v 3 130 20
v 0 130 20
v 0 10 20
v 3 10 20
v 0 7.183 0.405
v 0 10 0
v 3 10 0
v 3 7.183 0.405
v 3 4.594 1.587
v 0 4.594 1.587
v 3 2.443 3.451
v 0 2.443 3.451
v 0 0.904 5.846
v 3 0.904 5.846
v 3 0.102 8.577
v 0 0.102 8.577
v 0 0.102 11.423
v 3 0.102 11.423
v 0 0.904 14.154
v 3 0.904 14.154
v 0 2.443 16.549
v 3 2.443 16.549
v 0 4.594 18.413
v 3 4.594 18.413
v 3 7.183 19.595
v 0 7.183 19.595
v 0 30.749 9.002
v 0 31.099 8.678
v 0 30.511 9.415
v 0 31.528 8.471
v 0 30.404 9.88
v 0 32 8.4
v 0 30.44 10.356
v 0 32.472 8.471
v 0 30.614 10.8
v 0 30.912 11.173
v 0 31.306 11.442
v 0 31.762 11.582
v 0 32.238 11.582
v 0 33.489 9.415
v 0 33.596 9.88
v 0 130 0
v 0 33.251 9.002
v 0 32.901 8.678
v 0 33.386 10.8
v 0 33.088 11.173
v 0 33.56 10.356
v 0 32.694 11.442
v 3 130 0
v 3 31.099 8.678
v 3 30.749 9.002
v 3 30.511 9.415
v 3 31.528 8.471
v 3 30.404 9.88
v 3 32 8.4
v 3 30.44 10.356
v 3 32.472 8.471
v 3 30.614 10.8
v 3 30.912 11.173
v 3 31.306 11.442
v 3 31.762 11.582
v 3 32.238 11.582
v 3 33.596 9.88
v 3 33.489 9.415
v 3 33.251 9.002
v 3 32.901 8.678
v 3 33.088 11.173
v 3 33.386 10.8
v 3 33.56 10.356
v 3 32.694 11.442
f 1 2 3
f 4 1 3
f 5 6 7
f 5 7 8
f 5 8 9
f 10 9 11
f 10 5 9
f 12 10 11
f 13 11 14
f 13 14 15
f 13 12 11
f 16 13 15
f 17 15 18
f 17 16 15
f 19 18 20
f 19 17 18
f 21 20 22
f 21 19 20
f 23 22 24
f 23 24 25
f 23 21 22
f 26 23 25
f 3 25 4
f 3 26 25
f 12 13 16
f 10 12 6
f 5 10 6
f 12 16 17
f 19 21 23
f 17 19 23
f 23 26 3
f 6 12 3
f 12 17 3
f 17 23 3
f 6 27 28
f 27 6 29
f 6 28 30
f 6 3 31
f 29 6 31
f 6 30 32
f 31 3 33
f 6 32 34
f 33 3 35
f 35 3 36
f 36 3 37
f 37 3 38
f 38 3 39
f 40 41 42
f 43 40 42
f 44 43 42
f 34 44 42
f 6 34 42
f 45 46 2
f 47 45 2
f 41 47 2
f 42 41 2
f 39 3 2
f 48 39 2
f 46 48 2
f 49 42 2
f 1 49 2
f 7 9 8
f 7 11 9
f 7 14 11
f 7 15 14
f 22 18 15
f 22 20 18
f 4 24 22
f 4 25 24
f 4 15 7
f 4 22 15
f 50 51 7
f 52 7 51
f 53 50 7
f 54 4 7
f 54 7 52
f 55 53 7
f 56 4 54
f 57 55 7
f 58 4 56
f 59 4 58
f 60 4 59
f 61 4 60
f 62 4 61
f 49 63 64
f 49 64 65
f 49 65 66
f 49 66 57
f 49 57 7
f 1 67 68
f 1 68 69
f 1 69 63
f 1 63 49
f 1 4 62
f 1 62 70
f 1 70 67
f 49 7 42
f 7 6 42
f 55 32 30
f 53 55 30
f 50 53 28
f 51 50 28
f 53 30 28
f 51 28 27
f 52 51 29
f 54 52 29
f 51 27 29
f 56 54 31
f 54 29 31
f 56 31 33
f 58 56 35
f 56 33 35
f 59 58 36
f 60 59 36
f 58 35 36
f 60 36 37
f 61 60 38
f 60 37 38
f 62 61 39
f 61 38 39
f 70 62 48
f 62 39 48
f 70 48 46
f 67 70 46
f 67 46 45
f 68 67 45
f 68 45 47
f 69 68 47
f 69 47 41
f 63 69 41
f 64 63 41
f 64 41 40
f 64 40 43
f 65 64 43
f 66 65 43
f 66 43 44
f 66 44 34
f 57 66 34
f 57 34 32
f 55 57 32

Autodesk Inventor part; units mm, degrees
ref_plane "YZ Plane" through (0, 0, 0) normal (1, 0, 0) x (0, 1, 0)
ref_plane "XZ Plane" through (0, 0, 0) normal (0, 1, 0) x (-1, 0, 0)
ref_plane "XY Plane" through (0, 0, 0) normal (0, 0, 1) x (1, 0, 0)
sketch "Szkic1" plane through (0, 0, 0) normal (1, 0, 0) x (0, 1, 0)
  line L0 (10, 0) -> (130, 0)
  line L1 (130, 0) -> (130, 20)
  line L2 (130, 20) -> (10, 20)
  line L3 (0, 10) -> (0, 10)
  arc A0 (0, 10) -> (10, 0) centre (10, 10) ccw
  arc A1 (10, 20) -> (0, 10) centre (10, 10) ccw
  point P0 (0, 0)
  point P1 (0, 20)
  dimension "d0" = 20
  dimension "d2" = 10
  dimension "d5" = 120
extrude "Wyciągnięcie proste1" add sketch "Szkic1" along normal blind 3
sketch "Szkic2" plane through (3, 0, 0) normal (1, 0, 0) x (0, 0, -1)
  arc A0 (-20, 10) -> (0, 10) centre (-10, 10) ccw projected
  point P0 (0, 0)
sketch "Szkic3" plane through (3, 0, 0) normal (1, 0, 0) x (0, 0, -1)
  point P0 (0, 0)
  point P1 (-10, 32)
  dimension "d6" = 32
hole "Otwór1" at (3, 32, 10) direction (-1, 0, 0) diameter 3.2 end through all
properties material "Drewno (wiśnia)"
